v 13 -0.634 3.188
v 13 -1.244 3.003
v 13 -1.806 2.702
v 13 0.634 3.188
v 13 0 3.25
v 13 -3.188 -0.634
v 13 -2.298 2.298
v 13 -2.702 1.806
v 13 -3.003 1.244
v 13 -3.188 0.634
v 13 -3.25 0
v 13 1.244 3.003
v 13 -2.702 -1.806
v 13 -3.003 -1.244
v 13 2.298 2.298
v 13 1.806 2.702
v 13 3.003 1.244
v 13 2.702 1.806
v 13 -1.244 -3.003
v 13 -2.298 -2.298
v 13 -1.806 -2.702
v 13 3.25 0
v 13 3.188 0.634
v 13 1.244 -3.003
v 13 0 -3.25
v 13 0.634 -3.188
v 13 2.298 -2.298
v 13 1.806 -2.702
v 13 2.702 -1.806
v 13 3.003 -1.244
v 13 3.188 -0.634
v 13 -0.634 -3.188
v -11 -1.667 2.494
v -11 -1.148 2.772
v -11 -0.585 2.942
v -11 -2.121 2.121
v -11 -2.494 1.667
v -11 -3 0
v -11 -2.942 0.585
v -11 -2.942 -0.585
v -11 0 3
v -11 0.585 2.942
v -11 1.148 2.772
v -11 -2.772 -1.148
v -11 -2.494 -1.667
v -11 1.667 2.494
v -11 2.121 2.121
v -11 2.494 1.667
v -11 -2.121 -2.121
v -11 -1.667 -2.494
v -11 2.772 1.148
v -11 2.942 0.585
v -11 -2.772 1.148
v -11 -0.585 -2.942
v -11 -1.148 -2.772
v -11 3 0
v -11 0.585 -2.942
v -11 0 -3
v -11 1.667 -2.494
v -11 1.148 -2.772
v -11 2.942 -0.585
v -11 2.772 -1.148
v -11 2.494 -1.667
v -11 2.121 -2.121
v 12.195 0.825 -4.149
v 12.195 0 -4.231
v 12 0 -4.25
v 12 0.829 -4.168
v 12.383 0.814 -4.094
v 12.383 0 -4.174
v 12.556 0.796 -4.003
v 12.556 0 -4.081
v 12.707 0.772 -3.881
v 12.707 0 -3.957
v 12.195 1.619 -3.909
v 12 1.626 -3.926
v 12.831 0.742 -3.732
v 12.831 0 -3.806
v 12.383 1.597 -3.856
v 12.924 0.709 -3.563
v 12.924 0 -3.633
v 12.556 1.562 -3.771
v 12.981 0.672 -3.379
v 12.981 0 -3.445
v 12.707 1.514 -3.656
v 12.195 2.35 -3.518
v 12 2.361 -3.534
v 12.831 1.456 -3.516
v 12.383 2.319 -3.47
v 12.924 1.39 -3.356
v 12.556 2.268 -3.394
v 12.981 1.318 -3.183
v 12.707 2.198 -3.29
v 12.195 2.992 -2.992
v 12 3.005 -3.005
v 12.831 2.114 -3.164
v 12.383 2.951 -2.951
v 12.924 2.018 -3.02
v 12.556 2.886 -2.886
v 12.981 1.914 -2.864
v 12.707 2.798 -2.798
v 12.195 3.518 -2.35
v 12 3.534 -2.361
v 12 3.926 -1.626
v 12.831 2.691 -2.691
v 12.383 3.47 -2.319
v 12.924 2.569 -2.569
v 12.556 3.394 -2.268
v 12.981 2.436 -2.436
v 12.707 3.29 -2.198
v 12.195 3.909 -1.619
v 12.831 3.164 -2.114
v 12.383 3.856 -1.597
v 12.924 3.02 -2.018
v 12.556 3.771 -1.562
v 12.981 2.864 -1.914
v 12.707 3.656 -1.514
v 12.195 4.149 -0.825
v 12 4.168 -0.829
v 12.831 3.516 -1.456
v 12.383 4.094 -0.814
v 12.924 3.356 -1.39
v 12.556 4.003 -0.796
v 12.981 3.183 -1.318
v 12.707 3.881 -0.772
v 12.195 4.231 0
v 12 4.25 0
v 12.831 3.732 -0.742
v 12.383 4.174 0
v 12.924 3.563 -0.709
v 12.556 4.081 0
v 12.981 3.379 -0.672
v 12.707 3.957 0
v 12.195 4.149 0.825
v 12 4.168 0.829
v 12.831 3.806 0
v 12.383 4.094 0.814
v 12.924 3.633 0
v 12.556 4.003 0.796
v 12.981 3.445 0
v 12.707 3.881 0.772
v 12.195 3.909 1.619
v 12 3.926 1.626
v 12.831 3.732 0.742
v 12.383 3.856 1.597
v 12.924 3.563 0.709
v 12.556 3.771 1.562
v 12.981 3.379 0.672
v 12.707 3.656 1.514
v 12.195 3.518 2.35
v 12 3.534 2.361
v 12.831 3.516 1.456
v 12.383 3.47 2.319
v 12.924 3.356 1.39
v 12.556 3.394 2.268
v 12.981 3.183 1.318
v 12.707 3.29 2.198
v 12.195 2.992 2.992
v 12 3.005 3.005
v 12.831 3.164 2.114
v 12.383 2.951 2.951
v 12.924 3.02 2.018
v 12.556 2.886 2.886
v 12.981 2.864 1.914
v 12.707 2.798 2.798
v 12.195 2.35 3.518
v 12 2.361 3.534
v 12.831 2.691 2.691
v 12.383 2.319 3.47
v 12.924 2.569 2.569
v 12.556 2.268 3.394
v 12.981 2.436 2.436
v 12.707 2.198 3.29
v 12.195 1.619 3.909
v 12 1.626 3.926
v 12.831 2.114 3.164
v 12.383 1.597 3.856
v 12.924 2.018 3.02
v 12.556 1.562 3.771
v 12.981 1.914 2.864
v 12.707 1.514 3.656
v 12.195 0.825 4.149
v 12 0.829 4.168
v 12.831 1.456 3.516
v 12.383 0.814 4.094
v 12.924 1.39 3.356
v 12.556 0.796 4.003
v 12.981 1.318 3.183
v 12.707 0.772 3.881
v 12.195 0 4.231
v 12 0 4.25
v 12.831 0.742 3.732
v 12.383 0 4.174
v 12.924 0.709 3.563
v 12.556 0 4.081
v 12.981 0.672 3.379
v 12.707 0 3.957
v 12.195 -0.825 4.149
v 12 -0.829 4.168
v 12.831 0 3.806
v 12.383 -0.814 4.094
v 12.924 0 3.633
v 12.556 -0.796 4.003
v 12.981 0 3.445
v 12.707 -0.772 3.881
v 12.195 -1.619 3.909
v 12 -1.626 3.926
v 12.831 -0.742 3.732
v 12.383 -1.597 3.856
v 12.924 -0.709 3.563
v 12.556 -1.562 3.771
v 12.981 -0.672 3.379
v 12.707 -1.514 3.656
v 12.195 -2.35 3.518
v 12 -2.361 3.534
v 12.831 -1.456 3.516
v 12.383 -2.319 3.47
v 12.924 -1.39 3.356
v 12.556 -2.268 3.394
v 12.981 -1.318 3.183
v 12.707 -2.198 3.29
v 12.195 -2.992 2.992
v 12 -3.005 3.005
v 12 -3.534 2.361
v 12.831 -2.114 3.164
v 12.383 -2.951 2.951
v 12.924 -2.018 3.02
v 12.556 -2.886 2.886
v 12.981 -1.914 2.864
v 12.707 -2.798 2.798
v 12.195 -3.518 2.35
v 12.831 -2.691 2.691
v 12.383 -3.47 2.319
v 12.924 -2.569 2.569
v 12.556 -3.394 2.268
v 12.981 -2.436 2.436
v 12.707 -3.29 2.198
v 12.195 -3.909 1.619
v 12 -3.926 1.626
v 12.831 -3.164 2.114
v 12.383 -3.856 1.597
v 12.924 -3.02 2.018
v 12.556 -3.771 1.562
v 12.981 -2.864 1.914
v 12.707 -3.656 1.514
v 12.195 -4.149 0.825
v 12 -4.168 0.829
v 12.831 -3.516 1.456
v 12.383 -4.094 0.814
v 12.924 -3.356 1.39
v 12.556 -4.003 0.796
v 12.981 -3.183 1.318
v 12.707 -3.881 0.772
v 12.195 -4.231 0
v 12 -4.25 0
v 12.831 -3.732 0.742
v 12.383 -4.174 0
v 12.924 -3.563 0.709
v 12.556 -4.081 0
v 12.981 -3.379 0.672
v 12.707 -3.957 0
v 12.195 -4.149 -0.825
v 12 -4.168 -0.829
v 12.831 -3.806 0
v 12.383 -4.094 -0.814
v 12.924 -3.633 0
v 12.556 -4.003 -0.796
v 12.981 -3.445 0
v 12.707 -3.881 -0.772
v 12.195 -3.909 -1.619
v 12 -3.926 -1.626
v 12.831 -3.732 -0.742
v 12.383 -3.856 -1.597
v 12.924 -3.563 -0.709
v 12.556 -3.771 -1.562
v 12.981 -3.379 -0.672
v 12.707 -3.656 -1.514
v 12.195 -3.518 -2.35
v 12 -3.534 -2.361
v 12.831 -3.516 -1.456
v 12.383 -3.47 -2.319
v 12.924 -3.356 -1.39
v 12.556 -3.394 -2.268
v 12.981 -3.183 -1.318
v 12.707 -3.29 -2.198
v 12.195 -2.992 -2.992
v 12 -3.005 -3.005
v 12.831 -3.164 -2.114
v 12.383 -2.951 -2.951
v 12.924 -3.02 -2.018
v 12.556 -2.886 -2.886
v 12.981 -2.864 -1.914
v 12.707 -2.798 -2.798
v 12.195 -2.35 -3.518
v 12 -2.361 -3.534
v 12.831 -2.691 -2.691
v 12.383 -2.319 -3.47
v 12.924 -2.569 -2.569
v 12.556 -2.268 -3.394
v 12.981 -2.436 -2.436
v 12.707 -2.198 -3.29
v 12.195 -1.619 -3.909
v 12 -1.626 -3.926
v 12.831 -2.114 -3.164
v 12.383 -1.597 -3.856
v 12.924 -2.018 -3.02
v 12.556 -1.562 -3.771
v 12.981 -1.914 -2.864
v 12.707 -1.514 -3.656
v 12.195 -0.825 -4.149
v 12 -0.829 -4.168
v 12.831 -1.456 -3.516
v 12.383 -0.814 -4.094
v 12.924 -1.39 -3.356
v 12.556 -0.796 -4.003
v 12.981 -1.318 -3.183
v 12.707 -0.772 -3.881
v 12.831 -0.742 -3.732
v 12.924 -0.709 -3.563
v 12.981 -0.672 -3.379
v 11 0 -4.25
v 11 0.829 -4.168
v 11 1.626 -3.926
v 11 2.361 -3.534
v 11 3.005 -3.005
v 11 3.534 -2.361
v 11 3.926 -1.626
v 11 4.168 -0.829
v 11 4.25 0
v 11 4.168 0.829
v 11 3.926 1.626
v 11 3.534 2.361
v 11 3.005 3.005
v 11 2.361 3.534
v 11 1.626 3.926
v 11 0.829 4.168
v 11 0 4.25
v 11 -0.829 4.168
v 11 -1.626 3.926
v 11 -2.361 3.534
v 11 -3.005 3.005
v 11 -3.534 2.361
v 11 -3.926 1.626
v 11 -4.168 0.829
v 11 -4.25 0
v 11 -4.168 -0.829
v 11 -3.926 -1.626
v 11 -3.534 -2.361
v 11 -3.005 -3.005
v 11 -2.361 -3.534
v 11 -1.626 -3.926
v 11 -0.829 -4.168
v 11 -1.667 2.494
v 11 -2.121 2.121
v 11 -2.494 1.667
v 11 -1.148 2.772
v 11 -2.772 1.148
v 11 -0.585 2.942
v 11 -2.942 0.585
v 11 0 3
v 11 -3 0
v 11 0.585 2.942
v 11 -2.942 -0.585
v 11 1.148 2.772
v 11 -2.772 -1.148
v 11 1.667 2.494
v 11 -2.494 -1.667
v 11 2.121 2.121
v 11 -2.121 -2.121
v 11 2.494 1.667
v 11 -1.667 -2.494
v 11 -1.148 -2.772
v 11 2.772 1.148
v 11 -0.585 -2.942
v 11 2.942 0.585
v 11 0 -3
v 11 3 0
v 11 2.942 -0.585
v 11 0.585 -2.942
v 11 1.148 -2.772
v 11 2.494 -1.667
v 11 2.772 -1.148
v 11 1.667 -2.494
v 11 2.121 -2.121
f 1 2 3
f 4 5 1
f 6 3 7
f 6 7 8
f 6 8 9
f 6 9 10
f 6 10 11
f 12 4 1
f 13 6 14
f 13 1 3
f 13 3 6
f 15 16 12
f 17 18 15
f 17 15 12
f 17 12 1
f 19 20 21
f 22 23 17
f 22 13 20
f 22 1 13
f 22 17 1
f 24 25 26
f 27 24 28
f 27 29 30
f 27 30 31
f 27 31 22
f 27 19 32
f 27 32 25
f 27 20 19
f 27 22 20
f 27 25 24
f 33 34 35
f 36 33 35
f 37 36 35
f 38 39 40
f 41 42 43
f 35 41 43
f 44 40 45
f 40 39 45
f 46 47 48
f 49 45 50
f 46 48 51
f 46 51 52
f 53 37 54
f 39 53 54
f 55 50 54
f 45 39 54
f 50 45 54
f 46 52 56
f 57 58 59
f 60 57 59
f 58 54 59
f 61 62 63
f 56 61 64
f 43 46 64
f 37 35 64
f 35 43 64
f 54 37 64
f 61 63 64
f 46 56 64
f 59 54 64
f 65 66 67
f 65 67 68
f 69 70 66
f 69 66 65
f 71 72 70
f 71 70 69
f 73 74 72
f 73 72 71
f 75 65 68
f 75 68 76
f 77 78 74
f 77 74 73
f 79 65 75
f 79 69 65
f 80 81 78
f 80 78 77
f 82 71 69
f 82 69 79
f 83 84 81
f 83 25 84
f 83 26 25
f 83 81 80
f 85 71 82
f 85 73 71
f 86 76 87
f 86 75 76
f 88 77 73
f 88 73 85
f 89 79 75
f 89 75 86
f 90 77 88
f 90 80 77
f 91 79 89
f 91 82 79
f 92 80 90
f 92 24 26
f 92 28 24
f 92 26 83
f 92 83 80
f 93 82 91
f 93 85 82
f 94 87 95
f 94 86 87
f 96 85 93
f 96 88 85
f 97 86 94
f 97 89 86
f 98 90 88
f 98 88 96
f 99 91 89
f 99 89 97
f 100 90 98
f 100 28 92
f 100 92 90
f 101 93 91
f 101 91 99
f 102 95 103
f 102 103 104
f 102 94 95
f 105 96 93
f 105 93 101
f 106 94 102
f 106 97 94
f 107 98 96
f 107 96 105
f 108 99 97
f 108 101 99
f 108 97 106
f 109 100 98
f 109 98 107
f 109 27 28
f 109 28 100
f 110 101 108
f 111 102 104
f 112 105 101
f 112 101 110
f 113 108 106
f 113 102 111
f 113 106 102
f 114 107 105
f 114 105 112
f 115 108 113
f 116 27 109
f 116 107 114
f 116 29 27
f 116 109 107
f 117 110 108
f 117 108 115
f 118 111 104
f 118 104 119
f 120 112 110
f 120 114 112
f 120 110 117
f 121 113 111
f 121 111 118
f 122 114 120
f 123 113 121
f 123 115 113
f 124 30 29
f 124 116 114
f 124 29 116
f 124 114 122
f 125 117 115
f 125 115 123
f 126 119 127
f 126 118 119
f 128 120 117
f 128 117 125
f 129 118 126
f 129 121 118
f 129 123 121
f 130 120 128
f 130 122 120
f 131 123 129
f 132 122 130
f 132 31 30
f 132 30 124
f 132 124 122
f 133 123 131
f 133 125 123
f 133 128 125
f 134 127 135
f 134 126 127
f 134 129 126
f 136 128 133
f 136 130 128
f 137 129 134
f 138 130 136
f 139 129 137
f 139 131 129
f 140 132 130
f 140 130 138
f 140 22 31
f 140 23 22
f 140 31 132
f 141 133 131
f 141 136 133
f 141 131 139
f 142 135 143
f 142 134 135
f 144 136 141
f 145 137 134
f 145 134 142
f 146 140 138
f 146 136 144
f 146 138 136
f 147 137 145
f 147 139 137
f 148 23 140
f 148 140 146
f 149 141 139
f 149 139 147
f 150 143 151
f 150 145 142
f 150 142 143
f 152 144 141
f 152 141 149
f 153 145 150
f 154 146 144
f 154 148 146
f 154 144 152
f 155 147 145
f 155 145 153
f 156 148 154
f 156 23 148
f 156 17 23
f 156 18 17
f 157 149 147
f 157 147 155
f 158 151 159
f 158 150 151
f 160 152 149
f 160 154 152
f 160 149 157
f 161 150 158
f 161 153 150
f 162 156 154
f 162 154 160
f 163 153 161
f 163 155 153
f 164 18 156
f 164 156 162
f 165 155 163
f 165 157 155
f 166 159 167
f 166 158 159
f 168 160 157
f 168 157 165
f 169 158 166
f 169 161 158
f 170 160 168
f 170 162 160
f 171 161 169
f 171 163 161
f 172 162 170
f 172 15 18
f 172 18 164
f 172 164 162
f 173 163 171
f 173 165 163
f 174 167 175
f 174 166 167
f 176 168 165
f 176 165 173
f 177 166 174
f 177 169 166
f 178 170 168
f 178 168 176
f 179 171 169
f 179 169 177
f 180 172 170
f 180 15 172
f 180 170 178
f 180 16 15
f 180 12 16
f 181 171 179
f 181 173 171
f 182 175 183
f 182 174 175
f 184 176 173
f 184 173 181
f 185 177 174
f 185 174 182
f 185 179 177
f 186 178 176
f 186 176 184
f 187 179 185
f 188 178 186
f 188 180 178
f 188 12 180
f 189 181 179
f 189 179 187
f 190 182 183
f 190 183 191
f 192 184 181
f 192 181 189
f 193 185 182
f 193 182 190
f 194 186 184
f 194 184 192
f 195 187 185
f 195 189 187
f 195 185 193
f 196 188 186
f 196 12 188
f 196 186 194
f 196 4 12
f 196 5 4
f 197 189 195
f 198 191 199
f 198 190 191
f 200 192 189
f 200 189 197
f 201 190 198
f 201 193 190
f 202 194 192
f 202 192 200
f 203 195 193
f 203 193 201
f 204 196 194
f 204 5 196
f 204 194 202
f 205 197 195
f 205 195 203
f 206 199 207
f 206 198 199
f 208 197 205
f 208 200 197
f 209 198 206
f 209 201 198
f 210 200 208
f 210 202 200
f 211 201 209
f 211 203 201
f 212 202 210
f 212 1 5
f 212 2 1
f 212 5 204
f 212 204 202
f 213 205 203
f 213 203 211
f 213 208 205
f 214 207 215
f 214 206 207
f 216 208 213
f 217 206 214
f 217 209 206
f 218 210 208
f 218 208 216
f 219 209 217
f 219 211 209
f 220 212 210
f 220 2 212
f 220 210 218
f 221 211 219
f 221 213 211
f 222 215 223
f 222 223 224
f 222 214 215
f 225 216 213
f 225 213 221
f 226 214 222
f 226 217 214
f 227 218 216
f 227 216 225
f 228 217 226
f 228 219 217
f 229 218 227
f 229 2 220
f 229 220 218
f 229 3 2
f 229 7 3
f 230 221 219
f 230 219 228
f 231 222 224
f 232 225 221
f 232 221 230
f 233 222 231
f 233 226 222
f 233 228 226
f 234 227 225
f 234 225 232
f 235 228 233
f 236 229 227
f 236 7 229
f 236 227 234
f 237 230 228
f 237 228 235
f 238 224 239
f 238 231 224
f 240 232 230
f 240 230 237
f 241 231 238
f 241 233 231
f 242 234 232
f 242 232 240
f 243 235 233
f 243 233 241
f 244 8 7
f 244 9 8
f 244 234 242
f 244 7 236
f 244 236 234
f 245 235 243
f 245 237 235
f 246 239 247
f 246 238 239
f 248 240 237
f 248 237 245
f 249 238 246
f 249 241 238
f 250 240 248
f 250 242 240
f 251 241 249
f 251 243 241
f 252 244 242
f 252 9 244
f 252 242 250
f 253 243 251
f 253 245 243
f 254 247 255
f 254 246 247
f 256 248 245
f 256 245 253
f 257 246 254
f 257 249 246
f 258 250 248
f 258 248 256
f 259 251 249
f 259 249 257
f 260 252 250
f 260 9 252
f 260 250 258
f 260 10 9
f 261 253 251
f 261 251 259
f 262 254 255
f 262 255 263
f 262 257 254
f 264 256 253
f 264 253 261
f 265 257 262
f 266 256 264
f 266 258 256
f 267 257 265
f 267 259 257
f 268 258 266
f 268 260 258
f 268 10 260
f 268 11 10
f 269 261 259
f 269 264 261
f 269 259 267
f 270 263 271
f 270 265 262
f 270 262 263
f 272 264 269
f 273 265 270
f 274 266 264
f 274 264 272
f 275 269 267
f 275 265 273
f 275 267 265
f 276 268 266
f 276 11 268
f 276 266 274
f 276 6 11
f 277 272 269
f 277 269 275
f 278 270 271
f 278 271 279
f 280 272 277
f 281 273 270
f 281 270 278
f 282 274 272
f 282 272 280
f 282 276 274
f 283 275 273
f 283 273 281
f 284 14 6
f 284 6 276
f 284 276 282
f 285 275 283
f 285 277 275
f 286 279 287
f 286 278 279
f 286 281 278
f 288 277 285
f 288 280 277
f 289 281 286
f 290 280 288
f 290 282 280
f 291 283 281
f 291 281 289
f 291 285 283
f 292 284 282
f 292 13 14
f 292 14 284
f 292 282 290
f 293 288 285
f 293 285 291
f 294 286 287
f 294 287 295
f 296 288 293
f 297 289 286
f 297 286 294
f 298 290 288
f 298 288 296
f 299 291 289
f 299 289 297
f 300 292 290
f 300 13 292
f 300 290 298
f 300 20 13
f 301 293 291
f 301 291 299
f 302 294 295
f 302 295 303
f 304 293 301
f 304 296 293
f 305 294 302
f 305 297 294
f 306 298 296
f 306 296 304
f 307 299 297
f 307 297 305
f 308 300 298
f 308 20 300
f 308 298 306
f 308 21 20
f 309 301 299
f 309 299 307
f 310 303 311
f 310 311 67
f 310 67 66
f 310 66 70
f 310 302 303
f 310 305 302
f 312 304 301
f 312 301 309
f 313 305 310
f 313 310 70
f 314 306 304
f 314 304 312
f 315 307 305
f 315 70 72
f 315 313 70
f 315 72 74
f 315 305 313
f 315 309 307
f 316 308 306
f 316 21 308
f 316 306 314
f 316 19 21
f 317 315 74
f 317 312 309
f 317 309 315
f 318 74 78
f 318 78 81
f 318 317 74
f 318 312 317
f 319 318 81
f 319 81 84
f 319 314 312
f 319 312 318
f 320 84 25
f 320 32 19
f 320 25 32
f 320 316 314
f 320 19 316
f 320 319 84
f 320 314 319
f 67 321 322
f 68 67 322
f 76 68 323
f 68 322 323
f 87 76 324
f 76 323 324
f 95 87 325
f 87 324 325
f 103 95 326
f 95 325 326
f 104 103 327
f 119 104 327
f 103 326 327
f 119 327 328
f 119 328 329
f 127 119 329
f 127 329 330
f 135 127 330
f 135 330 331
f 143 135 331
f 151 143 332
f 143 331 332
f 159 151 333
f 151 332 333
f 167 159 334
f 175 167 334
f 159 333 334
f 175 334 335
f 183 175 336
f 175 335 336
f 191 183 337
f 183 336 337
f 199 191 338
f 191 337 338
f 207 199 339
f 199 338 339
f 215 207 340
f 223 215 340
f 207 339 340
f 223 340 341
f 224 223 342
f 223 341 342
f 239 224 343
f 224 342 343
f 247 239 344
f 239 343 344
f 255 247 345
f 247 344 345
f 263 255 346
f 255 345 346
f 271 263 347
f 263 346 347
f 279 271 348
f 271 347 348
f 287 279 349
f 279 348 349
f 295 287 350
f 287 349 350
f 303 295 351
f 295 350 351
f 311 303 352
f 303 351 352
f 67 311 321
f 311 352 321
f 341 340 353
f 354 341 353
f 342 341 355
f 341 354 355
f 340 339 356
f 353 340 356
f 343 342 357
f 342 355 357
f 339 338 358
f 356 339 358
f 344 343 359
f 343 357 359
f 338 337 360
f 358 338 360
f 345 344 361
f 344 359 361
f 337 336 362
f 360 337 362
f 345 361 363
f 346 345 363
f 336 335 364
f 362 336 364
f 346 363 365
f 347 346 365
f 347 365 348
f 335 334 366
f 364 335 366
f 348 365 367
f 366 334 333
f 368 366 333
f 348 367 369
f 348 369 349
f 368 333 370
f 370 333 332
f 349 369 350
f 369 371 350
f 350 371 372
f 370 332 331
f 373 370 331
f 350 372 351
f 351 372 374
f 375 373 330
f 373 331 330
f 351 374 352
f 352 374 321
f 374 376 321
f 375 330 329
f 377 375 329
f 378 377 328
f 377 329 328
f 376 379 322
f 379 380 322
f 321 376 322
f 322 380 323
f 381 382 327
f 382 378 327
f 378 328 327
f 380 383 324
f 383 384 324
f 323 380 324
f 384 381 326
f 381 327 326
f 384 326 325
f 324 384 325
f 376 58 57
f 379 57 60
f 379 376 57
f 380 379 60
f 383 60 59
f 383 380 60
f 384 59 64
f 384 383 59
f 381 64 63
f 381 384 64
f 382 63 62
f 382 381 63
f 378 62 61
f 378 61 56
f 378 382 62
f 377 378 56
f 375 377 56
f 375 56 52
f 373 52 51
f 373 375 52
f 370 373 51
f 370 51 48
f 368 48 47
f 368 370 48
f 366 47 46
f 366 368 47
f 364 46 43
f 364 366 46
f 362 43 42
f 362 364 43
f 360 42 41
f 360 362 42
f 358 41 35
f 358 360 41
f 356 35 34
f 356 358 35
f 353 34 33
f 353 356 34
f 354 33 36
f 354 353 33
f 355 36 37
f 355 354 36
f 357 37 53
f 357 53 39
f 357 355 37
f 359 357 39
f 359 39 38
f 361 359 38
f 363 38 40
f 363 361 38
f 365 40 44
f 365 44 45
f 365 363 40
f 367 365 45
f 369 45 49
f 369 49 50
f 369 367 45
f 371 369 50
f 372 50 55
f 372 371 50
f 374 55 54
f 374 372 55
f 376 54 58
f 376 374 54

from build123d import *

# Parameters (mm, degrees)
SKETCH2_R           = 3
BOSS_EXTRUDE1_DEPTH = 11
SKETCH3_R           = 4.25
BOSS_EXTRUDE2_DEPTH = 2
FILLET2_R           = 1


with BuildPart() as part:
    # Sketch2 → Boss-Extrude1 (new, symmetric)
    with BuildSketch(Plane(origin=(0, 0, 0), x_dir=(0, 0, -1), z_dir=(1, 0, 0))):
        Circle(SKETCH2_R)
    extrude(amount=BOSS_EXTRUDE1_DEPTH, both=True)

    # Sketch3 → Boss-Extrude2 (add)
    with BuildSketch(Plane(origin=(11, 0, 0), x_dir=(0, 0, -1), z_dir=(1, 0, 0))):
        Circle(SKETCH3_R)
    extrude(amount=BOSS_EXTRUDE2_DEPTH)

    # Fillet2
    fillet2_edges = [part.edges().sort_by_distance(p)[0] for p in [
        (13, 0, 4.25),
    ]]
    fillet(fillet2_edges, radius=FILLET2_R)


solid = part.part
